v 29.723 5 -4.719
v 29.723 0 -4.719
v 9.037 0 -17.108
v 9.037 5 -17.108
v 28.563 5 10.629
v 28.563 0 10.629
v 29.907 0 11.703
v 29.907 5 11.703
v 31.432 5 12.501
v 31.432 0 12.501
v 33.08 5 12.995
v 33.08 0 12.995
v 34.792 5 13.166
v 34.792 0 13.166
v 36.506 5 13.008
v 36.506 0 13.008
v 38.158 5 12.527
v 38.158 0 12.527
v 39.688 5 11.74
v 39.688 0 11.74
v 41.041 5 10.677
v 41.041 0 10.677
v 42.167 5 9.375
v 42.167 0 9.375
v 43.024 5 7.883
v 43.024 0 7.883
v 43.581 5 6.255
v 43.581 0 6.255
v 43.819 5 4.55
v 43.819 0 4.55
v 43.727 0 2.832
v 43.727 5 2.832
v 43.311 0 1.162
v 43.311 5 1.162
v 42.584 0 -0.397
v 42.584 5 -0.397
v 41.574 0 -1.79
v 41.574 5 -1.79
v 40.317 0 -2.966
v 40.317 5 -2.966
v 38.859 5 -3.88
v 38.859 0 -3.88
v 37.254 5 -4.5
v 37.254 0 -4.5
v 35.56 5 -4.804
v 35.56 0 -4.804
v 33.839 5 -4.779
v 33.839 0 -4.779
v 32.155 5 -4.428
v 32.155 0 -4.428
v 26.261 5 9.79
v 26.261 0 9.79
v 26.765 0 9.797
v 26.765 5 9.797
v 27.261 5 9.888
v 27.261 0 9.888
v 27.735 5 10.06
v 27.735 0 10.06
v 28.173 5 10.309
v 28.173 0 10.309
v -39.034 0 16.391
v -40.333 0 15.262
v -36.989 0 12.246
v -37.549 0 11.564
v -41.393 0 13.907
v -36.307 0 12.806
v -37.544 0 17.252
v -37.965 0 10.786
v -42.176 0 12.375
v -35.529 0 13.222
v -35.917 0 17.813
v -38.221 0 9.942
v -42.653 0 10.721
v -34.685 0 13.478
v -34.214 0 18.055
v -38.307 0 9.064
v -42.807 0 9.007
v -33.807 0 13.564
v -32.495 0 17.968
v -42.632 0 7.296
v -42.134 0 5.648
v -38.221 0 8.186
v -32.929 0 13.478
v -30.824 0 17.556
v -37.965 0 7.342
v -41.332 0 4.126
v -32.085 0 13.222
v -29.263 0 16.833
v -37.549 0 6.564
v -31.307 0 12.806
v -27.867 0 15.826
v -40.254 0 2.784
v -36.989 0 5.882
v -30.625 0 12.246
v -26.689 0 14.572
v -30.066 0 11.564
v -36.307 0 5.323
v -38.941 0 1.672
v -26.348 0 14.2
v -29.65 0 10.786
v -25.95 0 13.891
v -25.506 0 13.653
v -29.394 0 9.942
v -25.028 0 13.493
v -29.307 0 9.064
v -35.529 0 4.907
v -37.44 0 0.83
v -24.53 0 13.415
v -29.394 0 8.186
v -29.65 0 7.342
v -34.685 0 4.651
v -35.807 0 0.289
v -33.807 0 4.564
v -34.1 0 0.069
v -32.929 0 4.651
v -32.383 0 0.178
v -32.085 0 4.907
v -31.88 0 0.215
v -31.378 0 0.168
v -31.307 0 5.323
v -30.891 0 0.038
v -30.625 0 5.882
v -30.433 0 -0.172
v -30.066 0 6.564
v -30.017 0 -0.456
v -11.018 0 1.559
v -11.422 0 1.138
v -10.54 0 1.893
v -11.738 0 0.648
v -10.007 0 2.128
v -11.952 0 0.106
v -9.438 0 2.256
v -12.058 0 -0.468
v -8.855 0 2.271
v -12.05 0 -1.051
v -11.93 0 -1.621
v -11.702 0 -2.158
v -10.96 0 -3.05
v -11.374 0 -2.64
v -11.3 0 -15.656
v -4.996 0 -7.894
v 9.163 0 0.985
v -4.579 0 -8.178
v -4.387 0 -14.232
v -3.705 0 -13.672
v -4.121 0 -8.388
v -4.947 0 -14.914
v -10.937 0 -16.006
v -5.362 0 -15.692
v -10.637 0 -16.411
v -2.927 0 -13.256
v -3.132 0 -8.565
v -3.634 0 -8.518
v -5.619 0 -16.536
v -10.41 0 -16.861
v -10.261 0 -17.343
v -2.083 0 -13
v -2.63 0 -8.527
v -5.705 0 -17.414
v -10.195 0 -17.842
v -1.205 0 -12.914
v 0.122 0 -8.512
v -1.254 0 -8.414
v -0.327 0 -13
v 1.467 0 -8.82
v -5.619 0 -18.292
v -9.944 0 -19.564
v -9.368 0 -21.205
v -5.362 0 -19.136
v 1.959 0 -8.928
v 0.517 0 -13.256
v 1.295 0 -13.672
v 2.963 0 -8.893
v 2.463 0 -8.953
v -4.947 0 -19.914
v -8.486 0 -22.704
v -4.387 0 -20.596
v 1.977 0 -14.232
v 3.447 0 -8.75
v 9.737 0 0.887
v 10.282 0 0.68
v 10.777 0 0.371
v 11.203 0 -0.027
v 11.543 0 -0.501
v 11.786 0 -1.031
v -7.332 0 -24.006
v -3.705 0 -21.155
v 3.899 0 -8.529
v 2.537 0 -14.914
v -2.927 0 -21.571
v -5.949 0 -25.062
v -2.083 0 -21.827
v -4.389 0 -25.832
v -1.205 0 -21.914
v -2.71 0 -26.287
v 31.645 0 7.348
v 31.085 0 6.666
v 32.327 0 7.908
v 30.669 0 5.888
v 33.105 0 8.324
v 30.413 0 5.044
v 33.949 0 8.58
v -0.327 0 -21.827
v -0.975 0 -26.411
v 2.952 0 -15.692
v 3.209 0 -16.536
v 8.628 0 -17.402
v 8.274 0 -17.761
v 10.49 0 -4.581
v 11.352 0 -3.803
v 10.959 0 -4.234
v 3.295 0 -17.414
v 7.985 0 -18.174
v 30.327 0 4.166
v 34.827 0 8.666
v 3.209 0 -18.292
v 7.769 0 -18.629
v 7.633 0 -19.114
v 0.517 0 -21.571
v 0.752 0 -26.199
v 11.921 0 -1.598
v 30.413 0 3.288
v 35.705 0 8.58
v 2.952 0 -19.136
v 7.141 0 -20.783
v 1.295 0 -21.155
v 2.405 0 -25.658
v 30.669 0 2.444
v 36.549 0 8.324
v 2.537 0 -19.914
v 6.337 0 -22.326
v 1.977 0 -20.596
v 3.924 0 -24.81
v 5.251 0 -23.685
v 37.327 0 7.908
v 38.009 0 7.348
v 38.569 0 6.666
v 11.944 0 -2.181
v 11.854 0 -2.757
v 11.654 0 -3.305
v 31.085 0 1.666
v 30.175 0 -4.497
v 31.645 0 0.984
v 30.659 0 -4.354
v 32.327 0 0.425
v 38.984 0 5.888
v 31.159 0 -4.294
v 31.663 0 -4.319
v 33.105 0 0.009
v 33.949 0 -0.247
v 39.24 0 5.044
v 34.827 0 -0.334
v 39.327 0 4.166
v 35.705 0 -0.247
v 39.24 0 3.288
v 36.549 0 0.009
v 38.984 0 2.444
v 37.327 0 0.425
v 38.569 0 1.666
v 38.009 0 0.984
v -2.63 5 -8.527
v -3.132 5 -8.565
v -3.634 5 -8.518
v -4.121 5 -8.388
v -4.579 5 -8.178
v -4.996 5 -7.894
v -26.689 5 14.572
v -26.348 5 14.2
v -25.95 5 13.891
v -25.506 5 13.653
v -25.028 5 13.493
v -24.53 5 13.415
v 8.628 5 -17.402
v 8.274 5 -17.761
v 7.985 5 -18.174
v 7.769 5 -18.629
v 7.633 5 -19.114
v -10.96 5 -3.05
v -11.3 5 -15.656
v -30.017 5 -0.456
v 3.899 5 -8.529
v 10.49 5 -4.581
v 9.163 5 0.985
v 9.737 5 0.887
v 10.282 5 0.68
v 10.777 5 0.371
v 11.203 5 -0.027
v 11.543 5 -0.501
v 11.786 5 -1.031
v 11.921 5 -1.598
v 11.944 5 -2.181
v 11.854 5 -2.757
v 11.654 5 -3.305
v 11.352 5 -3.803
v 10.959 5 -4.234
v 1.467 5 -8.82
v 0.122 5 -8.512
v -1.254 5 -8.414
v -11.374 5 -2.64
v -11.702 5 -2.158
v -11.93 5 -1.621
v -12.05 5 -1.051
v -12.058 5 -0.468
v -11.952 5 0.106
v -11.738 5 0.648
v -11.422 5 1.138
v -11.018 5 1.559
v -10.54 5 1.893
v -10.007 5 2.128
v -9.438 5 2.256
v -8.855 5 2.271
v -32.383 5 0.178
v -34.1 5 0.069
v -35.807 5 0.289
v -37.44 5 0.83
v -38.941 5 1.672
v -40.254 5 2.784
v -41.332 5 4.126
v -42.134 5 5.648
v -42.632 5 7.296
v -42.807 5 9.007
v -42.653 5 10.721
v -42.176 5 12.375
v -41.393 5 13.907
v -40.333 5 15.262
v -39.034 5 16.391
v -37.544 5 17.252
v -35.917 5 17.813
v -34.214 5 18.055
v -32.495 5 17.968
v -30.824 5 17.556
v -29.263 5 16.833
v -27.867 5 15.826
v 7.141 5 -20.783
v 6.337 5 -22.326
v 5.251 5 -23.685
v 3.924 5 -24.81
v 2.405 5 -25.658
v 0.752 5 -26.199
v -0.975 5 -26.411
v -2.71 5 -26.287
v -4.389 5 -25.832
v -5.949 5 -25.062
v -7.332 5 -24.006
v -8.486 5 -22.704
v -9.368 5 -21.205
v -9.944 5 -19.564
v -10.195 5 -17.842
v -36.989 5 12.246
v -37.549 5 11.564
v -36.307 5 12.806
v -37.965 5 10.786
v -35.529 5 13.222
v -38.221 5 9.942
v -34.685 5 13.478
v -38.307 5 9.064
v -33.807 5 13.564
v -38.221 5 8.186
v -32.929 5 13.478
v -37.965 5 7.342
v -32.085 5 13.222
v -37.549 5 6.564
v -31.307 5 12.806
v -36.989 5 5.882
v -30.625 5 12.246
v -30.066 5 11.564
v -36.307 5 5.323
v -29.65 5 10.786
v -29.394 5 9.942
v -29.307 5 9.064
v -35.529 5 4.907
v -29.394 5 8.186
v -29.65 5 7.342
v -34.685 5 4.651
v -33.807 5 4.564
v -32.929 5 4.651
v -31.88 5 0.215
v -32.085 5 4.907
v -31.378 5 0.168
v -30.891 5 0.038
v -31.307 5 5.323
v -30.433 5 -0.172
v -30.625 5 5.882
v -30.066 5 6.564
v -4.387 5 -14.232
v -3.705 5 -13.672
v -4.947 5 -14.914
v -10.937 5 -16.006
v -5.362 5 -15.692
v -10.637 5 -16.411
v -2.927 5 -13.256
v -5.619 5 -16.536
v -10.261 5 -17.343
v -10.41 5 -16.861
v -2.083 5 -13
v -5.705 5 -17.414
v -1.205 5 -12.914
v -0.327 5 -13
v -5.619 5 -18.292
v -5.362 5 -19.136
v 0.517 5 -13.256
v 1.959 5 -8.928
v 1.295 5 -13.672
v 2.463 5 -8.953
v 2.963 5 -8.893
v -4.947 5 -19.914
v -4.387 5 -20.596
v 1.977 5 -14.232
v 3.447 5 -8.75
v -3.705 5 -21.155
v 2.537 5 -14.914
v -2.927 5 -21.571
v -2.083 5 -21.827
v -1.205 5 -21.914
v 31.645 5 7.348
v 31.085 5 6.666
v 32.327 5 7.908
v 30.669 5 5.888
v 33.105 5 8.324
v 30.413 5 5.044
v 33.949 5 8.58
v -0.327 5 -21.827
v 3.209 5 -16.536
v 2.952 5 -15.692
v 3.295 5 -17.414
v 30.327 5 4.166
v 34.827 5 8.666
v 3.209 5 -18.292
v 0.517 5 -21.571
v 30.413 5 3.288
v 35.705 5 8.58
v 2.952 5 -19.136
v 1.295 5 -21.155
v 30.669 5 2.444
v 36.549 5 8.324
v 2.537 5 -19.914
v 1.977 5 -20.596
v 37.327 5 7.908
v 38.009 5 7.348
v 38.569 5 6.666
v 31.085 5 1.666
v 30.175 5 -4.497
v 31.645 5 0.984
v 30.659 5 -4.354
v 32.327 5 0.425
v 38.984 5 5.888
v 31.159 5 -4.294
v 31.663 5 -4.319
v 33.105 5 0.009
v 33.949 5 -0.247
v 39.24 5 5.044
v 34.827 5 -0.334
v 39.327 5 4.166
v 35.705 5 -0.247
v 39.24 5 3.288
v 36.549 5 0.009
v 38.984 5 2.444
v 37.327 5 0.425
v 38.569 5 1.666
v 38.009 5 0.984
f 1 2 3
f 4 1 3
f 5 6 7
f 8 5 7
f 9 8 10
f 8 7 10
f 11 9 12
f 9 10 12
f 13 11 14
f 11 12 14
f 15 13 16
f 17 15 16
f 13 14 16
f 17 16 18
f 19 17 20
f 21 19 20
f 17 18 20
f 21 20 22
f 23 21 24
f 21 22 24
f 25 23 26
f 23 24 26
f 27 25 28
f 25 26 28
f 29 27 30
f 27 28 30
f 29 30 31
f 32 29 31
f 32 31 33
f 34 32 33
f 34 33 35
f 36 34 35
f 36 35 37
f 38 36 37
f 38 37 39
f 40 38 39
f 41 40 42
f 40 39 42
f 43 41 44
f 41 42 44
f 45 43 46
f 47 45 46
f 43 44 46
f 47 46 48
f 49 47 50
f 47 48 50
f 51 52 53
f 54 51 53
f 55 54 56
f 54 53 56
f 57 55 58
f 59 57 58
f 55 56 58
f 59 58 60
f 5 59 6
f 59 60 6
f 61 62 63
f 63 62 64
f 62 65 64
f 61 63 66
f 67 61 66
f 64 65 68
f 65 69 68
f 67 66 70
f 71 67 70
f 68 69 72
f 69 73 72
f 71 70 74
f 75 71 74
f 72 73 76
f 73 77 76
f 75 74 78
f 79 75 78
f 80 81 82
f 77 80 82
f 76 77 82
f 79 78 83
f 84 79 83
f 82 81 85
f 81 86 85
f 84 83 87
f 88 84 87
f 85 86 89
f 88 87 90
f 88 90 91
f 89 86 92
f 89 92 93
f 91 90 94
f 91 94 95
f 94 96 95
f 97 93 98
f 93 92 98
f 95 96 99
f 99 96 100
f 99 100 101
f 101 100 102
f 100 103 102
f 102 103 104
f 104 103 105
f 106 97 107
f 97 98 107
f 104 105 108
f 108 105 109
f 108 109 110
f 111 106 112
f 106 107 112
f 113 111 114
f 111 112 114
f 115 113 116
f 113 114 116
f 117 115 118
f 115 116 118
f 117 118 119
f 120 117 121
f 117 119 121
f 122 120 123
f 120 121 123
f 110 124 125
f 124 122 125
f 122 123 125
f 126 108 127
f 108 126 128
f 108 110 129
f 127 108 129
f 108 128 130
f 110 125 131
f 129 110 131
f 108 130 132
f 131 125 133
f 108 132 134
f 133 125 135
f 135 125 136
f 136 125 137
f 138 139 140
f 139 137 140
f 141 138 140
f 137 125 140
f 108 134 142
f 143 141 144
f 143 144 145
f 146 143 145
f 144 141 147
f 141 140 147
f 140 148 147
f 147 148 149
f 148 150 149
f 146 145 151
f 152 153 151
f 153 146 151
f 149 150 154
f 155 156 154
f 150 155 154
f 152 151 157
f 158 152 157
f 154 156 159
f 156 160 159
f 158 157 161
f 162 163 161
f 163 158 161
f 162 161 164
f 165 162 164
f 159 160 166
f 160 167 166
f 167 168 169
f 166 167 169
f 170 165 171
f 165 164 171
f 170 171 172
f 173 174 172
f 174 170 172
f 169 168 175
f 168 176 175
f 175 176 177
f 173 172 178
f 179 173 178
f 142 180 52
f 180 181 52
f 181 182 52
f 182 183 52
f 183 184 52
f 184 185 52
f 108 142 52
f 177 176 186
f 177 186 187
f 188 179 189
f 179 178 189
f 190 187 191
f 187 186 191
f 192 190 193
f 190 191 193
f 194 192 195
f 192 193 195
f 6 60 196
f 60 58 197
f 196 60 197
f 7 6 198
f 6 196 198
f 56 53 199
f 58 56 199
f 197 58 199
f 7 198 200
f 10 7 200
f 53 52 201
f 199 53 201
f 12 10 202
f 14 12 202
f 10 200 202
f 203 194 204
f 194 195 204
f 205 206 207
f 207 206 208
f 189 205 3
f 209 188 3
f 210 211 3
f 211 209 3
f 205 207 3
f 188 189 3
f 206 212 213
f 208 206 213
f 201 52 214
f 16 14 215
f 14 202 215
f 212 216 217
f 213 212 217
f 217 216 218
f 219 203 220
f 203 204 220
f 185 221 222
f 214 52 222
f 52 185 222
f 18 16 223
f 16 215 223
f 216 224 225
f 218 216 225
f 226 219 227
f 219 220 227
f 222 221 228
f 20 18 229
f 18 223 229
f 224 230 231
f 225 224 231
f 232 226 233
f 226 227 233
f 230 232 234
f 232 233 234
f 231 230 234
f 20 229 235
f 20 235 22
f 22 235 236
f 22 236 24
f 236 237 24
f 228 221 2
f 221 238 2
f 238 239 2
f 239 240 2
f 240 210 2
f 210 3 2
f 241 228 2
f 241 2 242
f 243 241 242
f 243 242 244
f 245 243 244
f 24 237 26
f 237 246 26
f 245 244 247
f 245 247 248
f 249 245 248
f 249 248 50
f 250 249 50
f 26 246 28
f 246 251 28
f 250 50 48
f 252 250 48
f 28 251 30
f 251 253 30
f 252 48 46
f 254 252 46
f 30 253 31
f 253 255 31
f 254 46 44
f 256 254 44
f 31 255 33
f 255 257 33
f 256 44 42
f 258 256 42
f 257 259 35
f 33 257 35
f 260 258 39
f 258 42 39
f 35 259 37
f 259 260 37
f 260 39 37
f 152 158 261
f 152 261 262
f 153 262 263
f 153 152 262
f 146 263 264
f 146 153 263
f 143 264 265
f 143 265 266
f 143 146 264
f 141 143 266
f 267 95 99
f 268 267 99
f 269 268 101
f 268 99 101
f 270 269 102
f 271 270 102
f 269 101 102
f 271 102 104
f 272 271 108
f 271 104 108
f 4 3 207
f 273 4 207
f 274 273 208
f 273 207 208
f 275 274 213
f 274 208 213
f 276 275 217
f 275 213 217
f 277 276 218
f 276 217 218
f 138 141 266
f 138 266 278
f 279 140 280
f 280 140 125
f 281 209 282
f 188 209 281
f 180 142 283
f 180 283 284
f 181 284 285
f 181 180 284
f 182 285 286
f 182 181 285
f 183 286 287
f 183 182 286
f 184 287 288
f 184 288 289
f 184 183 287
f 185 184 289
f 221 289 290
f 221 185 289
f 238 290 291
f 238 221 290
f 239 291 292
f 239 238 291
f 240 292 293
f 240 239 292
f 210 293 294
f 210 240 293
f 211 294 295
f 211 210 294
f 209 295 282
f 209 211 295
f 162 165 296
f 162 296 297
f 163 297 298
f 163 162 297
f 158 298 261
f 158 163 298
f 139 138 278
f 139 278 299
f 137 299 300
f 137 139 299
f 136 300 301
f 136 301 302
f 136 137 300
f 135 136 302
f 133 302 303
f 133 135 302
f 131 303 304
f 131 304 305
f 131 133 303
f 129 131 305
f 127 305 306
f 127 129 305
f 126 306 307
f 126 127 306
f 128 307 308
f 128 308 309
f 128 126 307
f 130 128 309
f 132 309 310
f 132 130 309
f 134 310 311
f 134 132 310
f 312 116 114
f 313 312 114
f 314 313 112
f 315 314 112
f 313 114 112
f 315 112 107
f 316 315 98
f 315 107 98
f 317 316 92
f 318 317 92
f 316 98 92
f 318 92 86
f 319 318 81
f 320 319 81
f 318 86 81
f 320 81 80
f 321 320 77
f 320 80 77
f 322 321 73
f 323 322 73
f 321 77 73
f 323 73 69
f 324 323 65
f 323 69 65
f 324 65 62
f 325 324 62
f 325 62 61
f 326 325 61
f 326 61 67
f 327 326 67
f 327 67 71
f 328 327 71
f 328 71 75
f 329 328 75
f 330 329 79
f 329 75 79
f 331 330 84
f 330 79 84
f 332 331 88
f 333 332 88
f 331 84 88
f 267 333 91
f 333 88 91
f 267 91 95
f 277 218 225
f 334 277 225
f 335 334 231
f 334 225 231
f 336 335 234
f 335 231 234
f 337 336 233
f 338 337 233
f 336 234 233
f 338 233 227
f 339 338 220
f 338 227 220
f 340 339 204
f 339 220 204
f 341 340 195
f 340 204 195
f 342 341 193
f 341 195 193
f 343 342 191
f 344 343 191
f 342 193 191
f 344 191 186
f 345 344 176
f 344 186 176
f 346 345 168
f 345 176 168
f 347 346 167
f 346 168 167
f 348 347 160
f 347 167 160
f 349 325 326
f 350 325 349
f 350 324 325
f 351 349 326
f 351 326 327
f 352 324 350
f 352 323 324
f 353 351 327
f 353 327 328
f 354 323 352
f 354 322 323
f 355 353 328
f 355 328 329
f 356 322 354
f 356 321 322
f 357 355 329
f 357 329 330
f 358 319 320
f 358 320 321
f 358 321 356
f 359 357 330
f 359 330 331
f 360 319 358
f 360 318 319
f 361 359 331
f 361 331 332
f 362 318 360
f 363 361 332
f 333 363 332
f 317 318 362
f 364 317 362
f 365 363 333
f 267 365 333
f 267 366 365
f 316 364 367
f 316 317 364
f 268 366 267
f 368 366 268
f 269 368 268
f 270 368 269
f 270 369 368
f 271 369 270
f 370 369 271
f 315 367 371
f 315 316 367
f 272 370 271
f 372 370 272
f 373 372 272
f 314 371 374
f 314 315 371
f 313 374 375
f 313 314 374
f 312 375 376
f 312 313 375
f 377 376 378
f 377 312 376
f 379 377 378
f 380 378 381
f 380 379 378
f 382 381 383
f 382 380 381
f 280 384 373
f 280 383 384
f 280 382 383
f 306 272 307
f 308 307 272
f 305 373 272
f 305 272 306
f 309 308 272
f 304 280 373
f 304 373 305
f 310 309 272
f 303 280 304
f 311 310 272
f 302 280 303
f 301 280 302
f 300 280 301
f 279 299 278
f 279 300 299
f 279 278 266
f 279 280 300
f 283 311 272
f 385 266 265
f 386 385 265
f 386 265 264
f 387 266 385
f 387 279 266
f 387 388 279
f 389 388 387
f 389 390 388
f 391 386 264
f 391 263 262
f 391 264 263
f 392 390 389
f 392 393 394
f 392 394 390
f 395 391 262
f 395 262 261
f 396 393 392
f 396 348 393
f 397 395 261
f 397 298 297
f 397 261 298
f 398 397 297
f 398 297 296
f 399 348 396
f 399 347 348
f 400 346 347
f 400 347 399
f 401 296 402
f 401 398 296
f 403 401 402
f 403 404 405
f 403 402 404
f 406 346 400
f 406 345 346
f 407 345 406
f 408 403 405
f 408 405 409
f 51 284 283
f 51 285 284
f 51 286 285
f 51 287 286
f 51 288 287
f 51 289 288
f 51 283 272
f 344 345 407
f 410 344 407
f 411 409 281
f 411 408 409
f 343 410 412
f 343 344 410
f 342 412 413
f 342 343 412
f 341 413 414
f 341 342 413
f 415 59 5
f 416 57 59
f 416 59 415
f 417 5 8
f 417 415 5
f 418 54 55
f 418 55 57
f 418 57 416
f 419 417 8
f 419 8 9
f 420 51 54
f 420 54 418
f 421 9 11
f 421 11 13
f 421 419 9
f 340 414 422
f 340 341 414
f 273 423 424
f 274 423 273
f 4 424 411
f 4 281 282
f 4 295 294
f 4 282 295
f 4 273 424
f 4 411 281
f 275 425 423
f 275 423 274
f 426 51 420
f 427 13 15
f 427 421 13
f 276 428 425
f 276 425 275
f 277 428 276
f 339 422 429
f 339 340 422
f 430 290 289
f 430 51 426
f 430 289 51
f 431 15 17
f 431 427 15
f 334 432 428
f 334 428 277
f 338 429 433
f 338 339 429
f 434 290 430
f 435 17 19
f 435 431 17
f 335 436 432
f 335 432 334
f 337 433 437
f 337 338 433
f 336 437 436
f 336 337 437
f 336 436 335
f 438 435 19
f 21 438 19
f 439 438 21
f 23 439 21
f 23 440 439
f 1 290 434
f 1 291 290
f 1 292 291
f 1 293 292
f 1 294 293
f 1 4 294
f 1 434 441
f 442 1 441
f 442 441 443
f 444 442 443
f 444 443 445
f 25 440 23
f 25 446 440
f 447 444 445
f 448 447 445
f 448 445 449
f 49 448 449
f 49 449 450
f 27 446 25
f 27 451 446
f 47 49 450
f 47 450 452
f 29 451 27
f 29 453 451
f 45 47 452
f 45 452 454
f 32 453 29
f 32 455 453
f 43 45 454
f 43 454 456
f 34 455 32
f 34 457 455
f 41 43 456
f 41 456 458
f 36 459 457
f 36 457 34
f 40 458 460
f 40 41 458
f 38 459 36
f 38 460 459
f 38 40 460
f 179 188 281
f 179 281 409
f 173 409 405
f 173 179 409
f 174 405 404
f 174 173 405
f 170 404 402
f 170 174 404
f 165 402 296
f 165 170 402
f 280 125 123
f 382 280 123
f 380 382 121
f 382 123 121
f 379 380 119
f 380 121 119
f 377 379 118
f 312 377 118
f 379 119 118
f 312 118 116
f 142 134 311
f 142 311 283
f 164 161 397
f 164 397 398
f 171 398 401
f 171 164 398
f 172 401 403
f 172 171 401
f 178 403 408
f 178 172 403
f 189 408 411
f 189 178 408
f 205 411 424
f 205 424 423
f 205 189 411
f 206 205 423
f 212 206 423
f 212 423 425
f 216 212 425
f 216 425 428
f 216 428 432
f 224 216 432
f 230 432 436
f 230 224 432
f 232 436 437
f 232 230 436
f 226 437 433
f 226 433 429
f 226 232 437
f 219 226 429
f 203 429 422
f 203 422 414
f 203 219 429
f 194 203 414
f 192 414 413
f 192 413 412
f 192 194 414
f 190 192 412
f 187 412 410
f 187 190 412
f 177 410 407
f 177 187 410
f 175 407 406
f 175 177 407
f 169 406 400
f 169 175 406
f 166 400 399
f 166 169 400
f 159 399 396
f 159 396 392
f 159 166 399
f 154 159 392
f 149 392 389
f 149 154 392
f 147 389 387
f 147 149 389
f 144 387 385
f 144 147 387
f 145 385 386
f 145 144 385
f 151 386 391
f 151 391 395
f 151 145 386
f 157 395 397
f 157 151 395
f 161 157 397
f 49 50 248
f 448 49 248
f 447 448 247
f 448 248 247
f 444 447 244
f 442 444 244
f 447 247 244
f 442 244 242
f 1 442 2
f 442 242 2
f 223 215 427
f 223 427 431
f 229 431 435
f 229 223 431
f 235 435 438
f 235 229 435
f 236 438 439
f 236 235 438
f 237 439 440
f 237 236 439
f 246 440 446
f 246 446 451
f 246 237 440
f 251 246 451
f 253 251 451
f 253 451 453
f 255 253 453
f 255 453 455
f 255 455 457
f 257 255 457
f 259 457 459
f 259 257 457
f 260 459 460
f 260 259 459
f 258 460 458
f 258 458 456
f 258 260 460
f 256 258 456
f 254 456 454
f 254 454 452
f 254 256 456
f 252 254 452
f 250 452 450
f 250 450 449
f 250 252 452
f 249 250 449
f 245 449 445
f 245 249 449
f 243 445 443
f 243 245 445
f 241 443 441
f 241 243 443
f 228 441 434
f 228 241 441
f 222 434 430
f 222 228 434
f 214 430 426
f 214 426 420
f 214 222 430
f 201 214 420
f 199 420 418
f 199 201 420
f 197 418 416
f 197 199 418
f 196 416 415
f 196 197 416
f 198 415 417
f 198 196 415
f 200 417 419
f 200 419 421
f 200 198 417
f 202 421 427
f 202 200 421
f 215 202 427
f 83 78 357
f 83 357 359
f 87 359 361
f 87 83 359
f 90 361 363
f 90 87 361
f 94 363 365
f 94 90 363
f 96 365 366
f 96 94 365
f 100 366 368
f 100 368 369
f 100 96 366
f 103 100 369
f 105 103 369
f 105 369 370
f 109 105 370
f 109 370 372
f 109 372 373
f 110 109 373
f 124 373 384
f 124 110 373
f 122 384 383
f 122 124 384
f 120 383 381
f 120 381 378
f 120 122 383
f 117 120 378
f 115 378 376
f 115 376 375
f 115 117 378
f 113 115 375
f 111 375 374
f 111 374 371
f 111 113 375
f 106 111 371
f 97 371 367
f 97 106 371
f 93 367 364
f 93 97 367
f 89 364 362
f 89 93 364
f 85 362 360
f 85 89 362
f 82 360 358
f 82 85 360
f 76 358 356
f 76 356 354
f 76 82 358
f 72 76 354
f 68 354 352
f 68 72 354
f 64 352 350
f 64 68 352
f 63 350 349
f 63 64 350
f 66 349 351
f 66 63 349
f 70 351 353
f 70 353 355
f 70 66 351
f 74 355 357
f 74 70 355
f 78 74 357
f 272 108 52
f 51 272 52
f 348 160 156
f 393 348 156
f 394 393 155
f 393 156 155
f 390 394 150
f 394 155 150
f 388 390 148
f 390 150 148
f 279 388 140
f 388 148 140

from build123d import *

# Parameters (mm, degrees)
SKETCH_1_R      = 4.5
EXTRUDE_1_DEPTH = 5


with BuildPart() as part:
    # 草图1 → 凸台-拉伸1 (new body)
    with BuildSketch(Plane(origin=(0, 0, 0), x_dir=(1, 0, 0), z_dir=(0, 1, 0))):
        with BuildLine():
            Line((-24.529804943, -13.414912777), (26.261252101, -9.790256419))
            ThreePointArc((26.261252101, -9.790256419), (27.501496461, -9.963799505), (28.562830813, -10.628549584))
            ThreePointArc((28.562830813, -10.628549584), (43.581244656, -6.254750357), (32.154801632, 4.427911945))
            ThreePointArc((32.154801632, 4.427911945), (30.907676626, 4.313883471), (29.722660532, 4.718926844))
            Line((29.722660532, 4.718926844), (9.037370221, 17.10767512))
            ThreePointArc((9.037370221, 17.10767512), (8.120961743, 17.961208234), (7.63285252, 19.114495996))
            ThreePointArc((7.63285252, 19.114495996), (-1.845653191, 26.39100116), (-10.194803688, 17.842241957))
            ThreePointArc((-10.194803688, 17.842241957), (-10.514193846, 16.631327756), (-11.300109489, 15.656309871))
            Line((-11.300109489, 15.656309871), (-30.016510781, 0.455696667))
            ThreePointArc((-30.016510781, 0.455696667), (-31.131999709, -0.113520099), (-32.382678895, -0.177745089))
            ThreePointArc((-32.382678895, -0.177745089), (-42.176335122, -12.374759959), (-26.689017586, -14.571546152))
            ThreePointArc((-26.689017586, -14.571546152), (-25.732836633, -13.762817978), (-24.529804943, -13.414912777))
        make_face()
        with Locations(Location((34.826919636, -4.166259648, 0), (0, 0, 270))):
            Circle(SKETCH_1_R, mode=Mode.SUBTRACT)
        with Locations(Location((-1.205005877, 17.413831728, 0), (0, 0, 270))):
            Circle(SKETCH_1_R, mode=Mode.SUBTRACT)
        with Locations(Location((-33.807302827, -9.064276845, 0), (0, 0, 270))):
            Circle(SKETCH_1_R, mode=Mode.SUBTRACT)
        with BuildLine():
            Line((-8.854823413, -2.270850546), (9.162609873, -0.985053244))
            ThreePointArc((9.162609873, -0.985053244), (11.867169109, 1.311172997), (10.490495867, 4.581045532))
            Line((10.490495867, 4.581045532), (3.899253226, 8.528645235))
            ThreePointArc((3.899253226, 8.528645235), (2.714237133, 8.933688608), (1.467112127, 8.819660134))
            ThreePointArc((1.467112127, 8.819660134), (-0.564358564, 8.436662295), (-2.62962981, 8.527299972))
            ThreePointArc((-2.62962981, 8.527299972), (-3.880308996, 8.463074982), (-4.995797924, 7.893858216))
            Line((-4.995797924, 7.893858216), (-10.959665987, 3.050274761))
            ThreePointArc((-10.959665987, 3.050274761), (-11.85804995, -0.381955107), (-8.854823413, -2.270850546))
        make_face(mode=Mode.SUBTRACT)
    extrude(amount=EXTRUDE_1_DEPTH)


solid = part.part
